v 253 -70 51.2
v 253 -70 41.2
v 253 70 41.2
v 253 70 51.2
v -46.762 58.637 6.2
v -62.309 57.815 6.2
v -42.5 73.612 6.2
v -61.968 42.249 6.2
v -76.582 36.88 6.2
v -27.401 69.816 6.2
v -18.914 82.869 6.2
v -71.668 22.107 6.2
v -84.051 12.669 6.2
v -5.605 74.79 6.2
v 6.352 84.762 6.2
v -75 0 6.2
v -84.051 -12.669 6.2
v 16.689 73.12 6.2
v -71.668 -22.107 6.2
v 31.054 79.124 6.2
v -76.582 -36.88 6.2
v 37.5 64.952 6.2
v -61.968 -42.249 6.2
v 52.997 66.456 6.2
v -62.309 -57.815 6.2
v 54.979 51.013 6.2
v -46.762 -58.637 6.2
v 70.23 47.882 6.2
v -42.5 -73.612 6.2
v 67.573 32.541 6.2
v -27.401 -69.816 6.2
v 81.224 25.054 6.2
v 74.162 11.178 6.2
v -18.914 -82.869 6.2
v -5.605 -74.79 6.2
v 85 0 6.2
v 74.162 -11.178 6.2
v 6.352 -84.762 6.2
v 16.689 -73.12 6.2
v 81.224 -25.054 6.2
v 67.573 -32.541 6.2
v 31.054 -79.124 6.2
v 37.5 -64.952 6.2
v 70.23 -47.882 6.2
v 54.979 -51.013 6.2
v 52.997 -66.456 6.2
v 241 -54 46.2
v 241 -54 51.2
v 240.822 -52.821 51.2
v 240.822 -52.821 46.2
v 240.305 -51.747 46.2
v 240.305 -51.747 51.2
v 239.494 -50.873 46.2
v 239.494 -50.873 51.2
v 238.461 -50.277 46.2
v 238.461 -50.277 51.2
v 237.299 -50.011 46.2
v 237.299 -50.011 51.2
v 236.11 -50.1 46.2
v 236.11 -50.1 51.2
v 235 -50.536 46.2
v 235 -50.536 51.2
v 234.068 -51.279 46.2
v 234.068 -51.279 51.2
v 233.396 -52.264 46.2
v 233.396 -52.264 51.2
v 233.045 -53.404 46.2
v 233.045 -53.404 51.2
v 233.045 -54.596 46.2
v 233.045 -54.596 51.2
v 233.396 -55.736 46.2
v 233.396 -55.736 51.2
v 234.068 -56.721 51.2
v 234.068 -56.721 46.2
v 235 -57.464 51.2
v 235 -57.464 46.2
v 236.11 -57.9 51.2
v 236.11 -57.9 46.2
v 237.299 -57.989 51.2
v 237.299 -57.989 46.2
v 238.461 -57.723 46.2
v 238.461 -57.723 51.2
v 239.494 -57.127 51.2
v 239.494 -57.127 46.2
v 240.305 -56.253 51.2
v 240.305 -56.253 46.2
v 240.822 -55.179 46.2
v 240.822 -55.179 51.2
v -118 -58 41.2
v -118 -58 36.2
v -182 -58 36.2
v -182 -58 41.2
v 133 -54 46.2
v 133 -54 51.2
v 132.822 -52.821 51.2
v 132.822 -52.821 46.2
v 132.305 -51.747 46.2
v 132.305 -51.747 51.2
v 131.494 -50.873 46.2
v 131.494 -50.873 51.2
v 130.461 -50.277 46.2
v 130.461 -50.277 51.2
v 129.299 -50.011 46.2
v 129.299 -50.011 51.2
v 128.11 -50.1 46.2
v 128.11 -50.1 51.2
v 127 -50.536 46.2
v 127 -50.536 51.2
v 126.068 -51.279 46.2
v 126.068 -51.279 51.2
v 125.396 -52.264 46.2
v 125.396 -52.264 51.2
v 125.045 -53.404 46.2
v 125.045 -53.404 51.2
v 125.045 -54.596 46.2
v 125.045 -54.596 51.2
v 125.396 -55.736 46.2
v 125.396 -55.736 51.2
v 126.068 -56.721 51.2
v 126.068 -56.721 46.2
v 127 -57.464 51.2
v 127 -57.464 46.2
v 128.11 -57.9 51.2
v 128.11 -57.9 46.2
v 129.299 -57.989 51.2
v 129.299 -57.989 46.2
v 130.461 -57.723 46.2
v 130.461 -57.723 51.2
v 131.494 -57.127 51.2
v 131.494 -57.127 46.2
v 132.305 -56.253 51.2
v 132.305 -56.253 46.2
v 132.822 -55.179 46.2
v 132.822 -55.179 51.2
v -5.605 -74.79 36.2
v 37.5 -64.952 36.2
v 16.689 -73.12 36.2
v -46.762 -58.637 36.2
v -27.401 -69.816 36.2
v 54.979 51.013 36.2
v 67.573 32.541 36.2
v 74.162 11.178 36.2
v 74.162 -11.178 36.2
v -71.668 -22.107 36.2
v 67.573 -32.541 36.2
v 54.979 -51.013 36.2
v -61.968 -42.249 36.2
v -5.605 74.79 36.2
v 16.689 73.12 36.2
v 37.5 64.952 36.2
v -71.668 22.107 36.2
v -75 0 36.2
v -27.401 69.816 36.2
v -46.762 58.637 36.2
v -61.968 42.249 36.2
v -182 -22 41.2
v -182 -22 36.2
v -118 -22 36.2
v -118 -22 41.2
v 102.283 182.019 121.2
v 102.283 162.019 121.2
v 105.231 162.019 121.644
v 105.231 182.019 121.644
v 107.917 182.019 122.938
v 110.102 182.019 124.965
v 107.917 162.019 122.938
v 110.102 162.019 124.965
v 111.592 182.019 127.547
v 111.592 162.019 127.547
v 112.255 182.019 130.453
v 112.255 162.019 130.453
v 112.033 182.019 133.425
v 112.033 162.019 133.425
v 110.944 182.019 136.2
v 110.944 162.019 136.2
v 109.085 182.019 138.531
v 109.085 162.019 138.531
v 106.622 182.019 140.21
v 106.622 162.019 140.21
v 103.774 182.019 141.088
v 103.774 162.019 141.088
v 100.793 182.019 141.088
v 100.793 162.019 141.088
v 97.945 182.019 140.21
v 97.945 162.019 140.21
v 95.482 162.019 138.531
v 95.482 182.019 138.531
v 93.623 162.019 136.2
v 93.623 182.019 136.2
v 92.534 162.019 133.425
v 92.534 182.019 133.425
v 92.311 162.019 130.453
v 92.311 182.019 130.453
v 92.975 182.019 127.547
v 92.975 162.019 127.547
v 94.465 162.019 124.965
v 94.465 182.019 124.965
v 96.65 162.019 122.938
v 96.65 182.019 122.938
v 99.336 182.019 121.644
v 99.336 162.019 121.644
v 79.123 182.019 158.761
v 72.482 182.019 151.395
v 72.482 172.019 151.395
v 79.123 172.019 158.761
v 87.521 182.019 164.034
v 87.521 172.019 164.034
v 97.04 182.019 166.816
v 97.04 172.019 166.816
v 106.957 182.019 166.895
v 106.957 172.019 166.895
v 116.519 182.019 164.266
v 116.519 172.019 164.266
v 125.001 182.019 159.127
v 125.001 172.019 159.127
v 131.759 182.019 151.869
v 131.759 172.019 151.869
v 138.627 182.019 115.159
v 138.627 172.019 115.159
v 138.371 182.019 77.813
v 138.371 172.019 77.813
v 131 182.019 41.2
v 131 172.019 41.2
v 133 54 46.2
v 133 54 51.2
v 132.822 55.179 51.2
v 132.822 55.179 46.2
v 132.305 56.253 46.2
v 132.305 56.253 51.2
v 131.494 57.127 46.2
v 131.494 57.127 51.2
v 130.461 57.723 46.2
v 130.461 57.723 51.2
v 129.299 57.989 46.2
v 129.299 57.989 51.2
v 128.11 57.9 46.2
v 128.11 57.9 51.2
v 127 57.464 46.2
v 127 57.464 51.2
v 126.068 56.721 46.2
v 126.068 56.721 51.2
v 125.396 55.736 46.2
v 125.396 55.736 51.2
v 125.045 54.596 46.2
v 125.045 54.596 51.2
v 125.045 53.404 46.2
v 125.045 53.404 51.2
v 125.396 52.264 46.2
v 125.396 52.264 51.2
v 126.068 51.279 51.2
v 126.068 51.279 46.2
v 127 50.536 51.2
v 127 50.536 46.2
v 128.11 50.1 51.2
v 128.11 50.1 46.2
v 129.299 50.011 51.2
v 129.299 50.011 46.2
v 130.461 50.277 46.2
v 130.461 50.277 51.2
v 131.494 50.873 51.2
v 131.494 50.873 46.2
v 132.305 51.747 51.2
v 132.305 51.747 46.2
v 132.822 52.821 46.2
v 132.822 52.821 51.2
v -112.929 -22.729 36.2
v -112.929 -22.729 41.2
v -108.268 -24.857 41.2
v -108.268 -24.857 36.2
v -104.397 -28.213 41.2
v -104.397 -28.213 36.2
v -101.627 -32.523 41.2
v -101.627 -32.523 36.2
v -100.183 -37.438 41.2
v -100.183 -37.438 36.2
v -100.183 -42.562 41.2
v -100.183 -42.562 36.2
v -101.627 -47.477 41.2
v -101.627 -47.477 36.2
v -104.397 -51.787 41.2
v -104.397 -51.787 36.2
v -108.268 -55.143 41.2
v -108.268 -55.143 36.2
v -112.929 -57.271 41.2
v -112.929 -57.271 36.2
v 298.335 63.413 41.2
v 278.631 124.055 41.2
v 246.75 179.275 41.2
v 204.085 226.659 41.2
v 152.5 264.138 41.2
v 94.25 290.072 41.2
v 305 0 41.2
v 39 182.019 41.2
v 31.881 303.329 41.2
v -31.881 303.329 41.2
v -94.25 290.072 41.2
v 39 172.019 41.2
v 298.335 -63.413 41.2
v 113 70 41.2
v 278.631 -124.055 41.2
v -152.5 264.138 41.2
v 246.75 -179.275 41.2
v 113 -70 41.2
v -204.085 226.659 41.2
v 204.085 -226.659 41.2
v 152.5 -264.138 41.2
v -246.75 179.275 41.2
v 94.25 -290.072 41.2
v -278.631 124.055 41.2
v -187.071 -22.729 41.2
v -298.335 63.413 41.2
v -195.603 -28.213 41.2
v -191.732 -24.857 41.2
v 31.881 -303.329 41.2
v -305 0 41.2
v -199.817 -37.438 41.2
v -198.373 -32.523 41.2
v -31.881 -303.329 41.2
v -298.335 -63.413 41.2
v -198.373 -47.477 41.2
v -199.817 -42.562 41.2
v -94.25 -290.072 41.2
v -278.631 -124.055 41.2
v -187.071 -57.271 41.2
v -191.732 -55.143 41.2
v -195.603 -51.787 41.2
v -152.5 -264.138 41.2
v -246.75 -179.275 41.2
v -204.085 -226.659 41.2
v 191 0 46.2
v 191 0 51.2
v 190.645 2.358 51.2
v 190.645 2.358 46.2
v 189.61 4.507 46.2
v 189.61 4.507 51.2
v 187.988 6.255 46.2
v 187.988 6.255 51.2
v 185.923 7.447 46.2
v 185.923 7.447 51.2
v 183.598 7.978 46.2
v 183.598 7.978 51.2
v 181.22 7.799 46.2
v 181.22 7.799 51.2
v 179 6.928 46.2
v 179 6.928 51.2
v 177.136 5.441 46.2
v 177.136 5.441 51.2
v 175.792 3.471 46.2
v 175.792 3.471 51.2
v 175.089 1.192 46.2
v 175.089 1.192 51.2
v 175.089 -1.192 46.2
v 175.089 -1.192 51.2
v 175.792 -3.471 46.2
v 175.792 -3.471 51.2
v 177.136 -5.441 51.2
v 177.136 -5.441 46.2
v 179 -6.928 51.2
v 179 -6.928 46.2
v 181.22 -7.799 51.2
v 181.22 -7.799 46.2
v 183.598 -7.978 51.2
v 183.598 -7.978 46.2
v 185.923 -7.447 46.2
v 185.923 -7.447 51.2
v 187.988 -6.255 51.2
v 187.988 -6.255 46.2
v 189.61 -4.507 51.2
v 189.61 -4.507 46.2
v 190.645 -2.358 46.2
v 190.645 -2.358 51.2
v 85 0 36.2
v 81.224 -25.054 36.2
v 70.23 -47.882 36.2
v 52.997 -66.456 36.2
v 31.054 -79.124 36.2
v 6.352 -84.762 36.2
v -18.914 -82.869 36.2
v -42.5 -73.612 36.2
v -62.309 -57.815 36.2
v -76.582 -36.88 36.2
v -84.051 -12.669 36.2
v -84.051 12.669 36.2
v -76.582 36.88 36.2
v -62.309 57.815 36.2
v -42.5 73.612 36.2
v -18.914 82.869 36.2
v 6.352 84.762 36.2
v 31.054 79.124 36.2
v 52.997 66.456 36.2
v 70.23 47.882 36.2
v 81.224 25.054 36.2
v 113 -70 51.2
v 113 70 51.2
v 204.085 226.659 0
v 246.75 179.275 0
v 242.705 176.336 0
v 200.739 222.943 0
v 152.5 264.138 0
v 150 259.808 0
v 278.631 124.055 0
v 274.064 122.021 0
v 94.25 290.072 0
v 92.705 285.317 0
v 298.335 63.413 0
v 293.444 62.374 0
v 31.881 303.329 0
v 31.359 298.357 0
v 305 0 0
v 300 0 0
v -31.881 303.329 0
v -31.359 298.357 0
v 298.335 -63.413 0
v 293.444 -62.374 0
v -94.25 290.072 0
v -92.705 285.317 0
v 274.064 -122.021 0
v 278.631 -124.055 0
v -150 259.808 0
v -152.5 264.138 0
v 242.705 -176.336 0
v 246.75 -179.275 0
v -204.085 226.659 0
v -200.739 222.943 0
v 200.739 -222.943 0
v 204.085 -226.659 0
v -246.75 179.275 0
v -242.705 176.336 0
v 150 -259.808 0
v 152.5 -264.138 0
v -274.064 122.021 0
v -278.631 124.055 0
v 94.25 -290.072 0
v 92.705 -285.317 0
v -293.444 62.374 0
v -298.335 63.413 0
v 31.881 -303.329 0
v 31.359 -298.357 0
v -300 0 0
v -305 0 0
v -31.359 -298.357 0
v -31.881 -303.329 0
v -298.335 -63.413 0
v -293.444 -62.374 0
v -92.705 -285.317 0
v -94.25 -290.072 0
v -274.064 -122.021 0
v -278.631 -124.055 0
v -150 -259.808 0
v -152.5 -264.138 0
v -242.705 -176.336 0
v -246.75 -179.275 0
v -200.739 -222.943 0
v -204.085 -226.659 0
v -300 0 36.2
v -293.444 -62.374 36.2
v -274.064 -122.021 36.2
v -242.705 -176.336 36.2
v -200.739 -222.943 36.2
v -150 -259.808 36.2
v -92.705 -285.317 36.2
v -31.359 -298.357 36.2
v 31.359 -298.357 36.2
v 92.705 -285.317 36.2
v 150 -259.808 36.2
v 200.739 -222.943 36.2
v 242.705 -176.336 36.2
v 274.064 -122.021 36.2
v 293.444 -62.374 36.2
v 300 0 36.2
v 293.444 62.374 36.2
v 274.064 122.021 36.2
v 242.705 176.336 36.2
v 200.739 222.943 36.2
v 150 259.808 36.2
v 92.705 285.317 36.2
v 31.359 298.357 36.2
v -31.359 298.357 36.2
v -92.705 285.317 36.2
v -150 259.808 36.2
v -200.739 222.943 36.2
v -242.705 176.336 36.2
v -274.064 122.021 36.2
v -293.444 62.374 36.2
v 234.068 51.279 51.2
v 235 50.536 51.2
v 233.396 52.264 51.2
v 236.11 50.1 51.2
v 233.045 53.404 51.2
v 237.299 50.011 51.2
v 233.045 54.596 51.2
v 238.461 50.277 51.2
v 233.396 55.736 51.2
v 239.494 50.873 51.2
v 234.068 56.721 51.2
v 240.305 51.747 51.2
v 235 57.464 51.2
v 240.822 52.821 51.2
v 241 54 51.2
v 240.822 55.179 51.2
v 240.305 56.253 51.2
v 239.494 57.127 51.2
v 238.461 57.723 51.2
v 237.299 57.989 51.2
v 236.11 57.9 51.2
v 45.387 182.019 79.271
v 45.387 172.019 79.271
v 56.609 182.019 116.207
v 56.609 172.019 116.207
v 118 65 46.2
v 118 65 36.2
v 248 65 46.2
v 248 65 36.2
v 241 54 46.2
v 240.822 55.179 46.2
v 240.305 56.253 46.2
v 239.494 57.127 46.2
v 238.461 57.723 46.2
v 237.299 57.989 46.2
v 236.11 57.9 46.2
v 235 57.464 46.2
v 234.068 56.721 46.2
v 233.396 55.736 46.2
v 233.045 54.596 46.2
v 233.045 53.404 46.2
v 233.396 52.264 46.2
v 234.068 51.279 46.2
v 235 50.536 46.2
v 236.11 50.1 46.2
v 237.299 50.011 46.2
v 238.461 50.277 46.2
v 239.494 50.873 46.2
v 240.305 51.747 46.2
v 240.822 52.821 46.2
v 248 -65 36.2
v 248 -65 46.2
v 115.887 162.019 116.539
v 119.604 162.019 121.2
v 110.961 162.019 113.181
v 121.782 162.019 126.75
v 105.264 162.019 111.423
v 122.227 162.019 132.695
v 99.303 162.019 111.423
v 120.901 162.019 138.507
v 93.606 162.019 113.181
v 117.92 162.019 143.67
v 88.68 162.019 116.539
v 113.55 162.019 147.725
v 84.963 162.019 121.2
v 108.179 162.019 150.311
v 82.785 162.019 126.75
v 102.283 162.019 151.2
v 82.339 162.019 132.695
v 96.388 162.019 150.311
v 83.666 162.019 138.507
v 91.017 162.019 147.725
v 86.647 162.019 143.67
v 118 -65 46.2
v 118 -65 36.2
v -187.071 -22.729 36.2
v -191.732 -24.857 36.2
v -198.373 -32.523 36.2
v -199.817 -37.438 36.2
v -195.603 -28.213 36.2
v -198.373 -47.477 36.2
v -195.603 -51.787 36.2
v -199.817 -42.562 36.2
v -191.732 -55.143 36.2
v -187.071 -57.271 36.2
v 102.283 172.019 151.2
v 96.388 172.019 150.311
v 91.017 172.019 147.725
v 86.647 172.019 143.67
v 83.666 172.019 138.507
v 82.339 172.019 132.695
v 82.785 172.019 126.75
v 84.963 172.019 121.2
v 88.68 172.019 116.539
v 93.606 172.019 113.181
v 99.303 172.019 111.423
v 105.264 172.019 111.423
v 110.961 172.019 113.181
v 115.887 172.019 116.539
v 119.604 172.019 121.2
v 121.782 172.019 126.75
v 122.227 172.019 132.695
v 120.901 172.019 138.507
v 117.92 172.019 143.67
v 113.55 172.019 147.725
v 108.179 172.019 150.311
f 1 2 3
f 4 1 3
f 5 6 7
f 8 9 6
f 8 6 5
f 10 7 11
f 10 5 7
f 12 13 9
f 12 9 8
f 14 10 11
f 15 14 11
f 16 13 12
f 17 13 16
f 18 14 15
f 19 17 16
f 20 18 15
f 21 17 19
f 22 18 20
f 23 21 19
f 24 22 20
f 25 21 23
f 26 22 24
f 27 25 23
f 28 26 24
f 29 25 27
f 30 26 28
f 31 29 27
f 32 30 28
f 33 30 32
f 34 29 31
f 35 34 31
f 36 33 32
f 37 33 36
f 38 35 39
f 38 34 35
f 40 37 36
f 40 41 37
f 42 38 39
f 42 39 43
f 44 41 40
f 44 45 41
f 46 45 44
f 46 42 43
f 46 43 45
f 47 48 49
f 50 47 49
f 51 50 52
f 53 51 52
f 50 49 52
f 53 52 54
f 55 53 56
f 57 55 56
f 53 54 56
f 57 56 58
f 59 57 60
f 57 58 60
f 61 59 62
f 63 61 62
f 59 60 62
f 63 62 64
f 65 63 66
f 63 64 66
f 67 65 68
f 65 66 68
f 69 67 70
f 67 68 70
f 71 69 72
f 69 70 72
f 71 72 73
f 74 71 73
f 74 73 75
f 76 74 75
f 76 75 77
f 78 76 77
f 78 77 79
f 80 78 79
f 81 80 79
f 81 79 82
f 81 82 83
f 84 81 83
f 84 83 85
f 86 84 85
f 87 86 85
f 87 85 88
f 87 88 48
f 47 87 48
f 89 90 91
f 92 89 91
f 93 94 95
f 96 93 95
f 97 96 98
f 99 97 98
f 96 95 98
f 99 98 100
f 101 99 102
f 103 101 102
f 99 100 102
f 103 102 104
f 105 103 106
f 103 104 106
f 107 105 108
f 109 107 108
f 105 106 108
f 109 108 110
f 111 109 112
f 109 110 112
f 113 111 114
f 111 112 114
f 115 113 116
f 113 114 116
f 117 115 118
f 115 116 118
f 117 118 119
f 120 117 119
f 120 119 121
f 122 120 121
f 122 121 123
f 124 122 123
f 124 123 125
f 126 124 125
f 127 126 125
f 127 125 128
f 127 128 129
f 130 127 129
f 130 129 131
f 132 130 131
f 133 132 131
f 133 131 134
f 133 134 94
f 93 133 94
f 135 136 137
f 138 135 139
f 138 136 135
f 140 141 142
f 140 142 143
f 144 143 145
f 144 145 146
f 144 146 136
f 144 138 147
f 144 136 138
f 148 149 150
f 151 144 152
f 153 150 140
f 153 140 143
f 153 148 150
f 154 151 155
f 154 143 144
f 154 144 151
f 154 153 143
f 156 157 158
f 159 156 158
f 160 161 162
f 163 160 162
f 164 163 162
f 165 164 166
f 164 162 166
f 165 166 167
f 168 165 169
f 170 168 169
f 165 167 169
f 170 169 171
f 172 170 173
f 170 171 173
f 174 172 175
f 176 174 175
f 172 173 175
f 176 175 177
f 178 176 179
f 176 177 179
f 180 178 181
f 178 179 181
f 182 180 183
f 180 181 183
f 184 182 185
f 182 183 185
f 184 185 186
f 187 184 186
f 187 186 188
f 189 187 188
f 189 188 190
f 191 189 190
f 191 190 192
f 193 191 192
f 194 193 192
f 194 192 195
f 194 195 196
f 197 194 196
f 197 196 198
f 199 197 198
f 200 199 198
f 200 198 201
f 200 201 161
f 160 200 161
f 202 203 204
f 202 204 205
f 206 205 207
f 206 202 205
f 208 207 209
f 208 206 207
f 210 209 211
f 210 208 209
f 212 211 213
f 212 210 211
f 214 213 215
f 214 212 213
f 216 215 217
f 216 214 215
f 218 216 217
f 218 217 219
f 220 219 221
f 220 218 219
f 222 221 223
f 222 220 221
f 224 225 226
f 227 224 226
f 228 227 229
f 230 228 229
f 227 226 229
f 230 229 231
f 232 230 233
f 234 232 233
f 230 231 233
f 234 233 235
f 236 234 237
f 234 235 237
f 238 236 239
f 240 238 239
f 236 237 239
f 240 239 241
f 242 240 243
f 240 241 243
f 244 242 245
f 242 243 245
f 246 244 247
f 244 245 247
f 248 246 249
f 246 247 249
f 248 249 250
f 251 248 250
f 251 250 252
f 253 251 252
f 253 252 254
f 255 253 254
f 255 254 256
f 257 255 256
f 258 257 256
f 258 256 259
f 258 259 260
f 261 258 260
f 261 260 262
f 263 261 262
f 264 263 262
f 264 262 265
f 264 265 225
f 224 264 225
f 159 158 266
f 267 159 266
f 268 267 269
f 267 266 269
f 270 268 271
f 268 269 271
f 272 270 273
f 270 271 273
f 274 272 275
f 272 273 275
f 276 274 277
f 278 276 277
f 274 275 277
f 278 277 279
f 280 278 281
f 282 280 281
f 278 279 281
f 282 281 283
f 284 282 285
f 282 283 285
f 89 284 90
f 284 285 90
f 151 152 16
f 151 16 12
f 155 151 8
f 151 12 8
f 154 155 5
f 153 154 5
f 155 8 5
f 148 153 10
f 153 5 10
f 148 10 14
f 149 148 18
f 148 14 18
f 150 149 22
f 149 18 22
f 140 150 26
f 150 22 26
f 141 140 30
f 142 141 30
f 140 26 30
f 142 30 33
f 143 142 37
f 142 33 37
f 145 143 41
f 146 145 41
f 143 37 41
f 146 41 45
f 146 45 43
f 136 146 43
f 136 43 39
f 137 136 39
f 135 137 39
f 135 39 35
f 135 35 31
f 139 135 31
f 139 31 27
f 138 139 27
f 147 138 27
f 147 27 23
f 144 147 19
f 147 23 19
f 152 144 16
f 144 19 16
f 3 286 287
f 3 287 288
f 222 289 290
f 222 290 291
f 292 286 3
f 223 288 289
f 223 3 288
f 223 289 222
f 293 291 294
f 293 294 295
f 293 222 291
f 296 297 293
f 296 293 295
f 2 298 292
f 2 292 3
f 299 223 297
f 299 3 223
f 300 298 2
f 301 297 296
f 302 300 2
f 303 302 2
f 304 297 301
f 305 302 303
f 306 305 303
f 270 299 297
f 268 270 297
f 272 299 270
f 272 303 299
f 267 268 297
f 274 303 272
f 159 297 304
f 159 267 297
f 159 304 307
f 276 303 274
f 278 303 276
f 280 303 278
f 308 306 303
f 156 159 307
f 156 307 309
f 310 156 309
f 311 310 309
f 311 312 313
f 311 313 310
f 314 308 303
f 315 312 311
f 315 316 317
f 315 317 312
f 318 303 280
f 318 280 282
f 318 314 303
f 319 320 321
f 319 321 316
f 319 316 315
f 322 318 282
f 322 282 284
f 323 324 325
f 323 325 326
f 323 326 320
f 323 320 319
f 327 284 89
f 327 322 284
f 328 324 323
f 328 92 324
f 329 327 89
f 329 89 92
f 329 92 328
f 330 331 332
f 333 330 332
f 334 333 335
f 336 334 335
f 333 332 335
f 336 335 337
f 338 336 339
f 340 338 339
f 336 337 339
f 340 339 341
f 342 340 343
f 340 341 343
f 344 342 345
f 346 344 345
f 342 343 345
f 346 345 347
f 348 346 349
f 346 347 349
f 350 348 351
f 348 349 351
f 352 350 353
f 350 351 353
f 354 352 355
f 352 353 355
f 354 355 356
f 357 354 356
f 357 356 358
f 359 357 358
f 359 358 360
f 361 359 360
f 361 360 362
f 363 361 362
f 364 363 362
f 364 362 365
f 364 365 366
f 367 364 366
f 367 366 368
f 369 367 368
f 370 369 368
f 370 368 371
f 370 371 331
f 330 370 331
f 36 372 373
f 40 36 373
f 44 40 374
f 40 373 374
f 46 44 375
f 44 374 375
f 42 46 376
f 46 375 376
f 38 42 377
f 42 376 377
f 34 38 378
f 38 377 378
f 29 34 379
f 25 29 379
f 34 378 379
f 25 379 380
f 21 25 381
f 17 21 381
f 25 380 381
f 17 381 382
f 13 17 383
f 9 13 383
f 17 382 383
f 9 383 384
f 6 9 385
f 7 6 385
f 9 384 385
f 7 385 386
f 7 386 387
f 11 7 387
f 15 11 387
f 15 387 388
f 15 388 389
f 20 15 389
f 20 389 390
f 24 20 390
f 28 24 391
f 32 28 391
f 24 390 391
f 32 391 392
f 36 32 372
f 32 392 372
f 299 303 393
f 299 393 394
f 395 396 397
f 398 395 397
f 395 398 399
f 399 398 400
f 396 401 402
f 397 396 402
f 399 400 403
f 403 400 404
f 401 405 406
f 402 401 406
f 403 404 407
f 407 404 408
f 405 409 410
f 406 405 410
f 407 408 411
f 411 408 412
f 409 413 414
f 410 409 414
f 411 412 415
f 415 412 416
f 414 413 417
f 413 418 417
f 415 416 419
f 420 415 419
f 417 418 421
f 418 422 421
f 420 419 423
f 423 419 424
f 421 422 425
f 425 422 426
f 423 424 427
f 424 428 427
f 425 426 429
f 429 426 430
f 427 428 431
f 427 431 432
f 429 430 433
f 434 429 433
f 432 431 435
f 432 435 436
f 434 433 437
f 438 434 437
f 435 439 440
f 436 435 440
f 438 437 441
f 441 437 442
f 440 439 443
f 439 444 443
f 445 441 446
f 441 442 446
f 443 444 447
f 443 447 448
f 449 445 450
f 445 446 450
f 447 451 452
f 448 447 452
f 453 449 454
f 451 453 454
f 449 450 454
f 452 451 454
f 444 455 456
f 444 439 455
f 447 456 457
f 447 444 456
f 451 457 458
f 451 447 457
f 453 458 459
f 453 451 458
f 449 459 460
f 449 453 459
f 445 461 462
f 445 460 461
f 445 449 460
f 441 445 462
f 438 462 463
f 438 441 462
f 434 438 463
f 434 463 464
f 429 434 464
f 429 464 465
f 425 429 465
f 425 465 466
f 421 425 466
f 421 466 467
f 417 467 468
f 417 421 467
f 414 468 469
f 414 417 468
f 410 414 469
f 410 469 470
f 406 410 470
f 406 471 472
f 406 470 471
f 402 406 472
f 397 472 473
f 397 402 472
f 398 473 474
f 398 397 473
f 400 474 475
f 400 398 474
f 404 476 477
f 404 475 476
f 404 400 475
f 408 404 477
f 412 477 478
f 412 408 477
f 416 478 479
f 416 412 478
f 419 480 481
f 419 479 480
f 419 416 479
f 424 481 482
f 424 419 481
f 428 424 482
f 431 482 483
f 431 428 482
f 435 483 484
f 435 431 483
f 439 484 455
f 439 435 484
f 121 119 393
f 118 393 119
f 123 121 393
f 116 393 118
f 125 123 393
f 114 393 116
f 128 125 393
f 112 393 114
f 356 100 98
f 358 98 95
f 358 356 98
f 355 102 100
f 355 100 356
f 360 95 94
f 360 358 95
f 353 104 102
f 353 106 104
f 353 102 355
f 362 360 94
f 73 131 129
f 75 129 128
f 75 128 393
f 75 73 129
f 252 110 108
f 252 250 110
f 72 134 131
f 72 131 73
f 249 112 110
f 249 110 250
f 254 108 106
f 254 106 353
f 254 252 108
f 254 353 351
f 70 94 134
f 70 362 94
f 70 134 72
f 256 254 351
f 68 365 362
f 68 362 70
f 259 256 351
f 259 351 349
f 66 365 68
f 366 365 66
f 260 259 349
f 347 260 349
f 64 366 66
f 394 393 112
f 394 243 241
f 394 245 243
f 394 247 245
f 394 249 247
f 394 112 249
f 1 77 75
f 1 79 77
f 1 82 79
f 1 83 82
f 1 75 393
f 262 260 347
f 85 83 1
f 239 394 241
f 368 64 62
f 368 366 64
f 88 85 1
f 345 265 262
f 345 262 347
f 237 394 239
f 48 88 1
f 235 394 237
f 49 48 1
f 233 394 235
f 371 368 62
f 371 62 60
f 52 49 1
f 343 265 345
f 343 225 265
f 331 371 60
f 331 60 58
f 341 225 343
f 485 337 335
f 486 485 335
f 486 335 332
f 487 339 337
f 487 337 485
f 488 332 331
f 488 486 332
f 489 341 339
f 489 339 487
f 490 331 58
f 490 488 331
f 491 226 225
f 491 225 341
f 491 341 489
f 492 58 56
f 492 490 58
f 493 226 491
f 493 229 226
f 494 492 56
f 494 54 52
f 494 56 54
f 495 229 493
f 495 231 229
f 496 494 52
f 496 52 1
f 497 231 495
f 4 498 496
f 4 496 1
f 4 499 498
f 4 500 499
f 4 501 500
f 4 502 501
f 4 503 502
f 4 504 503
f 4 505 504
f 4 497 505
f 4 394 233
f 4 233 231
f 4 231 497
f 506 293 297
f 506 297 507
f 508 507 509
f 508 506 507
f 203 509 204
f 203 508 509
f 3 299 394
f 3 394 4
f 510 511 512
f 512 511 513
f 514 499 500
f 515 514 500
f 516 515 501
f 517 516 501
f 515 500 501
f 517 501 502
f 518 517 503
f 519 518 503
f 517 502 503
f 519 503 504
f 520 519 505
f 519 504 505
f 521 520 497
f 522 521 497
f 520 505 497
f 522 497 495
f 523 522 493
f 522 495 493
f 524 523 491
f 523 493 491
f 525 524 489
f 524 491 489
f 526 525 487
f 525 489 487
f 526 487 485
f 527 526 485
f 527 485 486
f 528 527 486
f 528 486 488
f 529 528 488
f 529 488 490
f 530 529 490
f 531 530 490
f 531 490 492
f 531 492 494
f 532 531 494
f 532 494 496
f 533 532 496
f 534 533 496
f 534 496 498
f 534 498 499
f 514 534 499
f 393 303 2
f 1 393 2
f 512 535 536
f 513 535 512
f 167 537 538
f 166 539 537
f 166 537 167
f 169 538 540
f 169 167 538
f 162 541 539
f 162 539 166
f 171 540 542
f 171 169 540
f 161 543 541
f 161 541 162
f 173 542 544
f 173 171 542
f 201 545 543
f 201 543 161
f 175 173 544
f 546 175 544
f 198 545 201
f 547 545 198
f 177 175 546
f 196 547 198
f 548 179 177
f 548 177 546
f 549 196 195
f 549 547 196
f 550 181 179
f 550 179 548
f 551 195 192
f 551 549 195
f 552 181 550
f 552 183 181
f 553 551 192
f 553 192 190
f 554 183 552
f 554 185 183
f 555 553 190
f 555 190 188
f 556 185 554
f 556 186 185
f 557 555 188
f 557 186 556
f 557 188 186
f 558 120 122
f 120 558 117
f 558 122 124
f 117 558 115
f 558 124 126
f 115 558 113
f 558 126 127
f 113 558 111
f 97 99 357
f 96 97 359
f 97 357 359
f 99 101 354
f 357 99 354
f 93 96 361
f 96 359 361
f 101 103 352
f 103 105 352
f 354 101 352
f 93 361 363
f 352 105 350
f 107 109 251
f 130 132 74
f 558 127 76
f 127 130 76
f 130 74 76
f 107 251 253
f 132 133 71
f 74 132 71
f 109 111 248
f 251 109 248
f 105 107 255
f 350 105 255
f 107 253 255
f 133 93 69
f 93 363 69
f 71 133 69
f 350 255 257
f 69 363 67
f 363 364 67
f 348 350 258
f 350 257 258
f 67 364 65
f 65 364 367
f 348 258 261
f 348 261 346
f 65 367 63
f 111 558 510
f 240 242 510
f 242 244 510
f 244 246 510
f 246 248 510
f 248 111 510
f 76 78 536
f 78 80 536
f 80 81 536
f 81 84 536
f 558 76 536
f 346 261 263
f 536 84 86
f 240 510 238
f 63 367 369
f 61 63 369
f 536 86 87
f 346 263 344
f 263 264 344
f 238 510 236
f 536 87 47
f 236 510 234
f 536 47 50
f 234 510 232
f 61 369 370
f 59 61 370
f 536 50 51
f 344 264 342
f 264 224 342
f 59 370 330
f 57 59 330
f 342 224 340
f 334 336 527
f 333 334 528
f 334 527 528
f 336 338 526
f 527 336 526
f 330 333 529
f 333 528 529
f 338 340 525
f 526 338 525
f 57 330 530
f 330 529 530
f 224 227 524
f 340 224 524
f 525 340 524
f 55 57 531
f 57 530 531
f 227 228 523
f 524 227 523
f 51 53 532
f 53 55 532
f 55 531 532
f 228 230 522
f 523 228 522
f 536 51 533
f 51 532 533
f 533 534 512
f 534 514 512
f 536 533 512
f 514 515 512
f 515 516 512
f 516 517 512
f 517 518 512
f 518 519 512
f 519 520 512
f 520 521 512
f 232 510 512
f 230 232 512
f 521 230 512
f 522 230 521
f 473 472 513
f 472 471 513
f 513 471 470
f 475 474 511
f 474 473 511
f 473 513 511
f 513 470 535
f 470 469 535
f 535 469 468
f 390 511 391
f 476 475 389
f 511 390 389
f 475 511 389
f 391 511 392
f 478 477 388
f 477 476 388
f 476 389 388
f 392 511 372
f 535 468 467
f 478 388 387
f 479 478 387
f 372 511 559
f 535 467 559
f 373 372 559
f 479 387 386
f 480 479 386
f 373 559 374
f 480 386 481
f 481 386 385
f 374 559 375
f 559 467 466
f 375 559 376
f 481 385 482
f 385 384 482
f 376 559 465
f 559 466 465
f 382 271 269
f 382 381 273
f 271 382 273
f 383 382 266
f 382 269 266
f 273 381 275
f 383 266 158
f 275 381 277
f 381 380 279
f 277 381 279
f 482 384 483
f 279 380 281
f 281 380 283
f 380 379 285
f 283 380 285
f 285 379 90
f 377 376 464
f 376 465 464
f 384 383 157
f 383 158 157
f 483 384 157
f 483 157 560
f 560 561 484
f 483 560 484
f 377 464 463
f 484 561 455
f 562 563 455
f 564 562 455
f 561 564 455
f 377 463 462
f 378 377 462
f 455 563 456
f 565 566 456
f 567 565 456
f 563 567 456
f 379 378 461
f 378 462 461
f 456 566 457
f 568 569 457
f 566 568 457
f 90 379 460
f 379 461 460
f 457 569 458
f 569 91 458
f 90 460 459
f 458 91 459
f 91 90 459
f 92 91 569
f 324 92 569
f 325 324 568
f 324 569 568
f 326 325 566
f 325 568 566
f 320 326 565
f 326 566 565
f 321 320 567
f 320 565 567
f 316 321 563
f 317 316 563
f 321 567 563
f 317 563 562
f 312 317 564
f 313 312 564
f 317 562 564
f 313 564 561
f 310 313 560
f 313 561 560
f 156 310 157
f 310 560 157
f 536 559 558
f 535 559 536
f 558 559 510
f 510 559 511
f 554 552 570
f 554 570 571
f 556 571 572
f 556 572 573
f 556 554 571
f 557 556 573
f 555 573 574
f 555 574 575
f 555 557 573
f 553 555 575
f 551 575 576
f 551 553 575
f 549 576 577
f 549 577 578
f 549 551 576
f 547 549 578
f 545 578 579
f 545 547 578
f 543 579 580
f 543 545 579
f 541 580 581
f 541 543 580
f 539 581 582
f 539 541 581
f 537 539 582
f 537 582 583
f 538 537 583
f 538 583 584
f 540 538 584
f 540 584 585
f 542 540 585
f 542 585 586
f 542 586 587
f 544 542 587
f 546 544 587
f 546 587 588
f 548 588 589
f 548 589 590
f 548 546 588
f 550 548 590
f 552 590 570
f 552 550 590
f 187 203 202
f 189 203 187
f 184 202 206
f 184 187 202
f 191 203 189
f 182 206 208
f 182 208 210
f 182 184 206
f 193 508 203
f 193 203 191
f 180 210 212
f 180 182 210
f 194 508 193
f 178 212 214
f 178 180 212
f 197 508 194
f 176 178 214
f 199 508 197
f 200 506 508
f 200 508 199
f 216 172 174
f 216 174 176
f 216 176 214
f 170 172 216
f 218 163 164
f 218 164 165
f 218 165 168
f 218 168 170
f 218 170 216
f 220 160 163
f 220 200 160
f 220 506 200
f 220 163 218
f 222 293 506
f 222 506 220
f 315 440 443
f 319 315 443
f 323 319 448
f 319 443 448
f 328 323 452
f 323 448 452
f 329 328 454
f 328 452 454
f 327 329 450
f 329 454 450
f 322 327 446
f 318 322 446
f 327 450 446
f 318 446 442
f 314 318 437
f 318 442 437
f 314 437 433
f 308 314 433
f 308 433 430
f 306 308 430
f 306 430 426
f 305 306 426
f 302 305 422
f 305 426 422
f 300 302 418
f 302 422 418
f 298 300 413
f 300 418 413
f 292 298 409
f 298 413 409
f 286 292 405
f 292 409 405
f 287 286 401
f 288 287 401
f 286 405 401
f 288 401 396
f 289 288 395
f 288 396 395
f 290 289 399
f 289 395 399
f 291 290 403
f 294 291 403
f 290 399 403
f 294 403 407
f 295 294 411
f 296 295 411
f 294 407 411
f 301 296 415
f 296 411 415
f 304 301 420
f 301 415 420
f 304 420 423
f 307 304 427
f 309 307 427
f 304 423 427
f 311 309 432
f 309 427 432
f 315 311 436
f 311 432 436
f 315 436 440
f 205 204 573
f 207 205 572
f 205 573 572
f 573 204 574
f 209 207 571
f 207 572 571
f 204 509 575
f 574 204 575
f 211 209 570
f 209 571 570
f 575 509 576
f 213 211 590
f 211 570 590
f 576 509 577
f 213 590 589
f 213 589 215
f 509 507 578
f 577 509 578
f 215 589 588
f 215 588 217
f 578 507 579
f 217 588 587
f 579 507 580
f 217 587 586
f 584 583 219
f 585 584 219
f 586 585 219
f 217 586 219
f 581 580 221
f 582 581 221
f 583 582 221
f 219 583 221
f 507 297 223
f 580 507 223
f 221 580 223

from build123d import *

# Parameters (mm, degrees)
SKETCH_1_R           = 305
EXTRUDE_1_DEPTH      = 41.2
SKETCH_2_W           = 140
SKETCH_2_H           = 140
EXTRUDE_2_DEPTH      = 10
SHELL_1_T            = -5
CUT_EXTRUDE_9_DEPTH  = 100
SKETCH_5_W           = 120
SKETCH_5_H           = 10
EXTRUDE_3_DEPTH      = 150
CUT_EXTRUDE_10_DEPTH = 150
SKETCH_10_R          = 10
CUT_EXTRUDE_11_DEPTH = 150
EXTRUDE_START        = 10
SKETCH_11_R          = 20
SKETCH_11_R_2        = 10
EXTRUDE_4_DEPTH      = 10
SKETCH_18_R          = 85
EXTRUDE_7_DEPTH      = 30
SKETCH_19_R          = 75
CUT_EXTRUDE_12_DEPTH = 30
SKETCH_21_R          = 4
SKETCH_21_R_2        = 8
CUT_EXTRUDE_13_DEPTH = 30


with BuildPart() as part:
    # 草图1 → 凸台-拉伸1 (new body)
    with BuildSketch(Plane.XY):
        Circle(SKETCH_1_R)
    extrude(amount=EXTRUDE_1_DEPTH)

    # 草图2 → 凸台-拉伸2 (add)
    with BuildSketch(Plane.XY.offset(41.2)):
        with Locations((183, 0)):
            Rectangle(SKETCH_2_W, SKETCH_2_H)
    extrude(amount=EXTRUDE_2_DEPTH)

    # 抽壳1
    shell_1_openings = [part.faces().sort_by_distance(p)[0] for p in [
        (0, 0, 0),
    ]]
    offset(amount=SHELL_1_T, openings=shell_1_openings, kind=Kind.INTERSECTION)

    # 草图4 → 切除-拉伸9 (cut)
    with BuildSketch(Plane.XY):
        with BuildLine():
            Line((-182, -22), (-118, -22))
            ThreePointArc((-118, -22), (-100, -40), (-118, -58))
            Line((-118, -58), (-182, -58))
            ThreePointArc((-182, -58), (-200, -40), (-182, -22))
        make_face()
    extrude(amount=CUT_EXTRUDE_9_DEPTH, mode=Mode.SUBTRACT)

    # 草图5 → 凸台-拉伸3 (add)
    with BuildSketch(Plane.XY.offset(41.2)):
        with Locations((99, 177.019414693)):
            Rectangle(SKETCH_5_W, SKETCH_5_H)
    extrude(amount=EXTRUDE_3_DEPTH)

    # 草图9 → 切除-拉伸10 (cut)
    with BuildSketch(Plane.XZ.offset(-172.019414693)):
        with BuildLine():
            Line((159, 191.2), (39, 191.2))
            Line((39, 191.2), (39, 41.2))
            ThreePointArc((39, 41.2), (50.403223503, 97.919506773), (72.48168386, 151.395459716))
            ThreePointArc((72.48168386, 151.395459716), (95.641745104, 166.582031742), (122.732592827, 160.828217675))
            ThreePointArc((122.732592827, 160.828217675), (127.644425669, 156.750329387), (131.758731658, 151.868960626))
            ThreePointArc((131.758731658, 151.868960626), (139.395350951, 96.479523786), (131, 41.2))
            Line((131, 41.2), (159, 41.2))
            Line((159, 41.2), (159, 191.2))
        make_face()
    extrude(amount=-CUT_EXTRUDE_10_DEPTH, mode=Mode.SUBTRACT)

    # 草图10 → 切除-拉伸11 (cut)
    with BuildSketch(Plane.XZ.offset(-172.019414693)):
        with Locations((102.283418824, 131.2)):
            Circle(SKETCH_10_R)
    extrude(amount=-CUT_EXTRUDE_11_DEPTH, mode=Mode.SUBTRACT)

    # 草图11 → 凸台-拉伸4 (add)
    with BuildSketch(Plane.XZ.offset(-172.019414693).offset(EXTRUDE_START)):
        with Locations((102.283418824, 131.2)):
            Circle(SKETCH_11_R)
        with Locations((102.283418824, 131.2)):
            Circle(SKETCH_11_R_2, mode=Mode.SUBTRACT)
    extrude(amount=-EXTRUDE_4_DEPTH)

    # 草图18 → 凸台-拉伸7 (add)
    with BuildSketch(Plane(origin=(0, 0, 36.2), x_dir=(-1, 0, 0), z_dir=(0, 0, -1))):
        Circle(SKETCH_18_R)
    extrude(amount=EXTRUDE_7_DEPTH)

    # 草图19 → 切除-拉伸12 (cut)
    with BuildSketch(Plane(origin=(0, 0, 6.2), x_dir=(-1, 0, 0), z_dir=(0, 0, -1))):
        Circle(SKETCH_19_R)
    extrude(amount=-CUT_EXTRUDE_12_DEPTH, mode=Mode.SUBTRACT)

    # 草图21 → 切除-拉伸13 (cut)
    with BuildSketch(Plane.XY.offset(51.2)):
        with Locations((237, 54)):
            Circle(SKETCH_21_R)
        with Locations((129, 54)):
            Circle(SKETCH_21_R)
        with Locations((237, -54)):
            Circle(SKETCH_21_R)
        with Locations((129, -54)):
            Circle(SKETCH_21_R)
        with Locations((183, 0)):
            Circle(SKETCH_21_R_2)
    extrude(amount=-CUT_EXTRUDE_13_DEPTH, mode=Mode.SUBTRACT)


solid = part.part
